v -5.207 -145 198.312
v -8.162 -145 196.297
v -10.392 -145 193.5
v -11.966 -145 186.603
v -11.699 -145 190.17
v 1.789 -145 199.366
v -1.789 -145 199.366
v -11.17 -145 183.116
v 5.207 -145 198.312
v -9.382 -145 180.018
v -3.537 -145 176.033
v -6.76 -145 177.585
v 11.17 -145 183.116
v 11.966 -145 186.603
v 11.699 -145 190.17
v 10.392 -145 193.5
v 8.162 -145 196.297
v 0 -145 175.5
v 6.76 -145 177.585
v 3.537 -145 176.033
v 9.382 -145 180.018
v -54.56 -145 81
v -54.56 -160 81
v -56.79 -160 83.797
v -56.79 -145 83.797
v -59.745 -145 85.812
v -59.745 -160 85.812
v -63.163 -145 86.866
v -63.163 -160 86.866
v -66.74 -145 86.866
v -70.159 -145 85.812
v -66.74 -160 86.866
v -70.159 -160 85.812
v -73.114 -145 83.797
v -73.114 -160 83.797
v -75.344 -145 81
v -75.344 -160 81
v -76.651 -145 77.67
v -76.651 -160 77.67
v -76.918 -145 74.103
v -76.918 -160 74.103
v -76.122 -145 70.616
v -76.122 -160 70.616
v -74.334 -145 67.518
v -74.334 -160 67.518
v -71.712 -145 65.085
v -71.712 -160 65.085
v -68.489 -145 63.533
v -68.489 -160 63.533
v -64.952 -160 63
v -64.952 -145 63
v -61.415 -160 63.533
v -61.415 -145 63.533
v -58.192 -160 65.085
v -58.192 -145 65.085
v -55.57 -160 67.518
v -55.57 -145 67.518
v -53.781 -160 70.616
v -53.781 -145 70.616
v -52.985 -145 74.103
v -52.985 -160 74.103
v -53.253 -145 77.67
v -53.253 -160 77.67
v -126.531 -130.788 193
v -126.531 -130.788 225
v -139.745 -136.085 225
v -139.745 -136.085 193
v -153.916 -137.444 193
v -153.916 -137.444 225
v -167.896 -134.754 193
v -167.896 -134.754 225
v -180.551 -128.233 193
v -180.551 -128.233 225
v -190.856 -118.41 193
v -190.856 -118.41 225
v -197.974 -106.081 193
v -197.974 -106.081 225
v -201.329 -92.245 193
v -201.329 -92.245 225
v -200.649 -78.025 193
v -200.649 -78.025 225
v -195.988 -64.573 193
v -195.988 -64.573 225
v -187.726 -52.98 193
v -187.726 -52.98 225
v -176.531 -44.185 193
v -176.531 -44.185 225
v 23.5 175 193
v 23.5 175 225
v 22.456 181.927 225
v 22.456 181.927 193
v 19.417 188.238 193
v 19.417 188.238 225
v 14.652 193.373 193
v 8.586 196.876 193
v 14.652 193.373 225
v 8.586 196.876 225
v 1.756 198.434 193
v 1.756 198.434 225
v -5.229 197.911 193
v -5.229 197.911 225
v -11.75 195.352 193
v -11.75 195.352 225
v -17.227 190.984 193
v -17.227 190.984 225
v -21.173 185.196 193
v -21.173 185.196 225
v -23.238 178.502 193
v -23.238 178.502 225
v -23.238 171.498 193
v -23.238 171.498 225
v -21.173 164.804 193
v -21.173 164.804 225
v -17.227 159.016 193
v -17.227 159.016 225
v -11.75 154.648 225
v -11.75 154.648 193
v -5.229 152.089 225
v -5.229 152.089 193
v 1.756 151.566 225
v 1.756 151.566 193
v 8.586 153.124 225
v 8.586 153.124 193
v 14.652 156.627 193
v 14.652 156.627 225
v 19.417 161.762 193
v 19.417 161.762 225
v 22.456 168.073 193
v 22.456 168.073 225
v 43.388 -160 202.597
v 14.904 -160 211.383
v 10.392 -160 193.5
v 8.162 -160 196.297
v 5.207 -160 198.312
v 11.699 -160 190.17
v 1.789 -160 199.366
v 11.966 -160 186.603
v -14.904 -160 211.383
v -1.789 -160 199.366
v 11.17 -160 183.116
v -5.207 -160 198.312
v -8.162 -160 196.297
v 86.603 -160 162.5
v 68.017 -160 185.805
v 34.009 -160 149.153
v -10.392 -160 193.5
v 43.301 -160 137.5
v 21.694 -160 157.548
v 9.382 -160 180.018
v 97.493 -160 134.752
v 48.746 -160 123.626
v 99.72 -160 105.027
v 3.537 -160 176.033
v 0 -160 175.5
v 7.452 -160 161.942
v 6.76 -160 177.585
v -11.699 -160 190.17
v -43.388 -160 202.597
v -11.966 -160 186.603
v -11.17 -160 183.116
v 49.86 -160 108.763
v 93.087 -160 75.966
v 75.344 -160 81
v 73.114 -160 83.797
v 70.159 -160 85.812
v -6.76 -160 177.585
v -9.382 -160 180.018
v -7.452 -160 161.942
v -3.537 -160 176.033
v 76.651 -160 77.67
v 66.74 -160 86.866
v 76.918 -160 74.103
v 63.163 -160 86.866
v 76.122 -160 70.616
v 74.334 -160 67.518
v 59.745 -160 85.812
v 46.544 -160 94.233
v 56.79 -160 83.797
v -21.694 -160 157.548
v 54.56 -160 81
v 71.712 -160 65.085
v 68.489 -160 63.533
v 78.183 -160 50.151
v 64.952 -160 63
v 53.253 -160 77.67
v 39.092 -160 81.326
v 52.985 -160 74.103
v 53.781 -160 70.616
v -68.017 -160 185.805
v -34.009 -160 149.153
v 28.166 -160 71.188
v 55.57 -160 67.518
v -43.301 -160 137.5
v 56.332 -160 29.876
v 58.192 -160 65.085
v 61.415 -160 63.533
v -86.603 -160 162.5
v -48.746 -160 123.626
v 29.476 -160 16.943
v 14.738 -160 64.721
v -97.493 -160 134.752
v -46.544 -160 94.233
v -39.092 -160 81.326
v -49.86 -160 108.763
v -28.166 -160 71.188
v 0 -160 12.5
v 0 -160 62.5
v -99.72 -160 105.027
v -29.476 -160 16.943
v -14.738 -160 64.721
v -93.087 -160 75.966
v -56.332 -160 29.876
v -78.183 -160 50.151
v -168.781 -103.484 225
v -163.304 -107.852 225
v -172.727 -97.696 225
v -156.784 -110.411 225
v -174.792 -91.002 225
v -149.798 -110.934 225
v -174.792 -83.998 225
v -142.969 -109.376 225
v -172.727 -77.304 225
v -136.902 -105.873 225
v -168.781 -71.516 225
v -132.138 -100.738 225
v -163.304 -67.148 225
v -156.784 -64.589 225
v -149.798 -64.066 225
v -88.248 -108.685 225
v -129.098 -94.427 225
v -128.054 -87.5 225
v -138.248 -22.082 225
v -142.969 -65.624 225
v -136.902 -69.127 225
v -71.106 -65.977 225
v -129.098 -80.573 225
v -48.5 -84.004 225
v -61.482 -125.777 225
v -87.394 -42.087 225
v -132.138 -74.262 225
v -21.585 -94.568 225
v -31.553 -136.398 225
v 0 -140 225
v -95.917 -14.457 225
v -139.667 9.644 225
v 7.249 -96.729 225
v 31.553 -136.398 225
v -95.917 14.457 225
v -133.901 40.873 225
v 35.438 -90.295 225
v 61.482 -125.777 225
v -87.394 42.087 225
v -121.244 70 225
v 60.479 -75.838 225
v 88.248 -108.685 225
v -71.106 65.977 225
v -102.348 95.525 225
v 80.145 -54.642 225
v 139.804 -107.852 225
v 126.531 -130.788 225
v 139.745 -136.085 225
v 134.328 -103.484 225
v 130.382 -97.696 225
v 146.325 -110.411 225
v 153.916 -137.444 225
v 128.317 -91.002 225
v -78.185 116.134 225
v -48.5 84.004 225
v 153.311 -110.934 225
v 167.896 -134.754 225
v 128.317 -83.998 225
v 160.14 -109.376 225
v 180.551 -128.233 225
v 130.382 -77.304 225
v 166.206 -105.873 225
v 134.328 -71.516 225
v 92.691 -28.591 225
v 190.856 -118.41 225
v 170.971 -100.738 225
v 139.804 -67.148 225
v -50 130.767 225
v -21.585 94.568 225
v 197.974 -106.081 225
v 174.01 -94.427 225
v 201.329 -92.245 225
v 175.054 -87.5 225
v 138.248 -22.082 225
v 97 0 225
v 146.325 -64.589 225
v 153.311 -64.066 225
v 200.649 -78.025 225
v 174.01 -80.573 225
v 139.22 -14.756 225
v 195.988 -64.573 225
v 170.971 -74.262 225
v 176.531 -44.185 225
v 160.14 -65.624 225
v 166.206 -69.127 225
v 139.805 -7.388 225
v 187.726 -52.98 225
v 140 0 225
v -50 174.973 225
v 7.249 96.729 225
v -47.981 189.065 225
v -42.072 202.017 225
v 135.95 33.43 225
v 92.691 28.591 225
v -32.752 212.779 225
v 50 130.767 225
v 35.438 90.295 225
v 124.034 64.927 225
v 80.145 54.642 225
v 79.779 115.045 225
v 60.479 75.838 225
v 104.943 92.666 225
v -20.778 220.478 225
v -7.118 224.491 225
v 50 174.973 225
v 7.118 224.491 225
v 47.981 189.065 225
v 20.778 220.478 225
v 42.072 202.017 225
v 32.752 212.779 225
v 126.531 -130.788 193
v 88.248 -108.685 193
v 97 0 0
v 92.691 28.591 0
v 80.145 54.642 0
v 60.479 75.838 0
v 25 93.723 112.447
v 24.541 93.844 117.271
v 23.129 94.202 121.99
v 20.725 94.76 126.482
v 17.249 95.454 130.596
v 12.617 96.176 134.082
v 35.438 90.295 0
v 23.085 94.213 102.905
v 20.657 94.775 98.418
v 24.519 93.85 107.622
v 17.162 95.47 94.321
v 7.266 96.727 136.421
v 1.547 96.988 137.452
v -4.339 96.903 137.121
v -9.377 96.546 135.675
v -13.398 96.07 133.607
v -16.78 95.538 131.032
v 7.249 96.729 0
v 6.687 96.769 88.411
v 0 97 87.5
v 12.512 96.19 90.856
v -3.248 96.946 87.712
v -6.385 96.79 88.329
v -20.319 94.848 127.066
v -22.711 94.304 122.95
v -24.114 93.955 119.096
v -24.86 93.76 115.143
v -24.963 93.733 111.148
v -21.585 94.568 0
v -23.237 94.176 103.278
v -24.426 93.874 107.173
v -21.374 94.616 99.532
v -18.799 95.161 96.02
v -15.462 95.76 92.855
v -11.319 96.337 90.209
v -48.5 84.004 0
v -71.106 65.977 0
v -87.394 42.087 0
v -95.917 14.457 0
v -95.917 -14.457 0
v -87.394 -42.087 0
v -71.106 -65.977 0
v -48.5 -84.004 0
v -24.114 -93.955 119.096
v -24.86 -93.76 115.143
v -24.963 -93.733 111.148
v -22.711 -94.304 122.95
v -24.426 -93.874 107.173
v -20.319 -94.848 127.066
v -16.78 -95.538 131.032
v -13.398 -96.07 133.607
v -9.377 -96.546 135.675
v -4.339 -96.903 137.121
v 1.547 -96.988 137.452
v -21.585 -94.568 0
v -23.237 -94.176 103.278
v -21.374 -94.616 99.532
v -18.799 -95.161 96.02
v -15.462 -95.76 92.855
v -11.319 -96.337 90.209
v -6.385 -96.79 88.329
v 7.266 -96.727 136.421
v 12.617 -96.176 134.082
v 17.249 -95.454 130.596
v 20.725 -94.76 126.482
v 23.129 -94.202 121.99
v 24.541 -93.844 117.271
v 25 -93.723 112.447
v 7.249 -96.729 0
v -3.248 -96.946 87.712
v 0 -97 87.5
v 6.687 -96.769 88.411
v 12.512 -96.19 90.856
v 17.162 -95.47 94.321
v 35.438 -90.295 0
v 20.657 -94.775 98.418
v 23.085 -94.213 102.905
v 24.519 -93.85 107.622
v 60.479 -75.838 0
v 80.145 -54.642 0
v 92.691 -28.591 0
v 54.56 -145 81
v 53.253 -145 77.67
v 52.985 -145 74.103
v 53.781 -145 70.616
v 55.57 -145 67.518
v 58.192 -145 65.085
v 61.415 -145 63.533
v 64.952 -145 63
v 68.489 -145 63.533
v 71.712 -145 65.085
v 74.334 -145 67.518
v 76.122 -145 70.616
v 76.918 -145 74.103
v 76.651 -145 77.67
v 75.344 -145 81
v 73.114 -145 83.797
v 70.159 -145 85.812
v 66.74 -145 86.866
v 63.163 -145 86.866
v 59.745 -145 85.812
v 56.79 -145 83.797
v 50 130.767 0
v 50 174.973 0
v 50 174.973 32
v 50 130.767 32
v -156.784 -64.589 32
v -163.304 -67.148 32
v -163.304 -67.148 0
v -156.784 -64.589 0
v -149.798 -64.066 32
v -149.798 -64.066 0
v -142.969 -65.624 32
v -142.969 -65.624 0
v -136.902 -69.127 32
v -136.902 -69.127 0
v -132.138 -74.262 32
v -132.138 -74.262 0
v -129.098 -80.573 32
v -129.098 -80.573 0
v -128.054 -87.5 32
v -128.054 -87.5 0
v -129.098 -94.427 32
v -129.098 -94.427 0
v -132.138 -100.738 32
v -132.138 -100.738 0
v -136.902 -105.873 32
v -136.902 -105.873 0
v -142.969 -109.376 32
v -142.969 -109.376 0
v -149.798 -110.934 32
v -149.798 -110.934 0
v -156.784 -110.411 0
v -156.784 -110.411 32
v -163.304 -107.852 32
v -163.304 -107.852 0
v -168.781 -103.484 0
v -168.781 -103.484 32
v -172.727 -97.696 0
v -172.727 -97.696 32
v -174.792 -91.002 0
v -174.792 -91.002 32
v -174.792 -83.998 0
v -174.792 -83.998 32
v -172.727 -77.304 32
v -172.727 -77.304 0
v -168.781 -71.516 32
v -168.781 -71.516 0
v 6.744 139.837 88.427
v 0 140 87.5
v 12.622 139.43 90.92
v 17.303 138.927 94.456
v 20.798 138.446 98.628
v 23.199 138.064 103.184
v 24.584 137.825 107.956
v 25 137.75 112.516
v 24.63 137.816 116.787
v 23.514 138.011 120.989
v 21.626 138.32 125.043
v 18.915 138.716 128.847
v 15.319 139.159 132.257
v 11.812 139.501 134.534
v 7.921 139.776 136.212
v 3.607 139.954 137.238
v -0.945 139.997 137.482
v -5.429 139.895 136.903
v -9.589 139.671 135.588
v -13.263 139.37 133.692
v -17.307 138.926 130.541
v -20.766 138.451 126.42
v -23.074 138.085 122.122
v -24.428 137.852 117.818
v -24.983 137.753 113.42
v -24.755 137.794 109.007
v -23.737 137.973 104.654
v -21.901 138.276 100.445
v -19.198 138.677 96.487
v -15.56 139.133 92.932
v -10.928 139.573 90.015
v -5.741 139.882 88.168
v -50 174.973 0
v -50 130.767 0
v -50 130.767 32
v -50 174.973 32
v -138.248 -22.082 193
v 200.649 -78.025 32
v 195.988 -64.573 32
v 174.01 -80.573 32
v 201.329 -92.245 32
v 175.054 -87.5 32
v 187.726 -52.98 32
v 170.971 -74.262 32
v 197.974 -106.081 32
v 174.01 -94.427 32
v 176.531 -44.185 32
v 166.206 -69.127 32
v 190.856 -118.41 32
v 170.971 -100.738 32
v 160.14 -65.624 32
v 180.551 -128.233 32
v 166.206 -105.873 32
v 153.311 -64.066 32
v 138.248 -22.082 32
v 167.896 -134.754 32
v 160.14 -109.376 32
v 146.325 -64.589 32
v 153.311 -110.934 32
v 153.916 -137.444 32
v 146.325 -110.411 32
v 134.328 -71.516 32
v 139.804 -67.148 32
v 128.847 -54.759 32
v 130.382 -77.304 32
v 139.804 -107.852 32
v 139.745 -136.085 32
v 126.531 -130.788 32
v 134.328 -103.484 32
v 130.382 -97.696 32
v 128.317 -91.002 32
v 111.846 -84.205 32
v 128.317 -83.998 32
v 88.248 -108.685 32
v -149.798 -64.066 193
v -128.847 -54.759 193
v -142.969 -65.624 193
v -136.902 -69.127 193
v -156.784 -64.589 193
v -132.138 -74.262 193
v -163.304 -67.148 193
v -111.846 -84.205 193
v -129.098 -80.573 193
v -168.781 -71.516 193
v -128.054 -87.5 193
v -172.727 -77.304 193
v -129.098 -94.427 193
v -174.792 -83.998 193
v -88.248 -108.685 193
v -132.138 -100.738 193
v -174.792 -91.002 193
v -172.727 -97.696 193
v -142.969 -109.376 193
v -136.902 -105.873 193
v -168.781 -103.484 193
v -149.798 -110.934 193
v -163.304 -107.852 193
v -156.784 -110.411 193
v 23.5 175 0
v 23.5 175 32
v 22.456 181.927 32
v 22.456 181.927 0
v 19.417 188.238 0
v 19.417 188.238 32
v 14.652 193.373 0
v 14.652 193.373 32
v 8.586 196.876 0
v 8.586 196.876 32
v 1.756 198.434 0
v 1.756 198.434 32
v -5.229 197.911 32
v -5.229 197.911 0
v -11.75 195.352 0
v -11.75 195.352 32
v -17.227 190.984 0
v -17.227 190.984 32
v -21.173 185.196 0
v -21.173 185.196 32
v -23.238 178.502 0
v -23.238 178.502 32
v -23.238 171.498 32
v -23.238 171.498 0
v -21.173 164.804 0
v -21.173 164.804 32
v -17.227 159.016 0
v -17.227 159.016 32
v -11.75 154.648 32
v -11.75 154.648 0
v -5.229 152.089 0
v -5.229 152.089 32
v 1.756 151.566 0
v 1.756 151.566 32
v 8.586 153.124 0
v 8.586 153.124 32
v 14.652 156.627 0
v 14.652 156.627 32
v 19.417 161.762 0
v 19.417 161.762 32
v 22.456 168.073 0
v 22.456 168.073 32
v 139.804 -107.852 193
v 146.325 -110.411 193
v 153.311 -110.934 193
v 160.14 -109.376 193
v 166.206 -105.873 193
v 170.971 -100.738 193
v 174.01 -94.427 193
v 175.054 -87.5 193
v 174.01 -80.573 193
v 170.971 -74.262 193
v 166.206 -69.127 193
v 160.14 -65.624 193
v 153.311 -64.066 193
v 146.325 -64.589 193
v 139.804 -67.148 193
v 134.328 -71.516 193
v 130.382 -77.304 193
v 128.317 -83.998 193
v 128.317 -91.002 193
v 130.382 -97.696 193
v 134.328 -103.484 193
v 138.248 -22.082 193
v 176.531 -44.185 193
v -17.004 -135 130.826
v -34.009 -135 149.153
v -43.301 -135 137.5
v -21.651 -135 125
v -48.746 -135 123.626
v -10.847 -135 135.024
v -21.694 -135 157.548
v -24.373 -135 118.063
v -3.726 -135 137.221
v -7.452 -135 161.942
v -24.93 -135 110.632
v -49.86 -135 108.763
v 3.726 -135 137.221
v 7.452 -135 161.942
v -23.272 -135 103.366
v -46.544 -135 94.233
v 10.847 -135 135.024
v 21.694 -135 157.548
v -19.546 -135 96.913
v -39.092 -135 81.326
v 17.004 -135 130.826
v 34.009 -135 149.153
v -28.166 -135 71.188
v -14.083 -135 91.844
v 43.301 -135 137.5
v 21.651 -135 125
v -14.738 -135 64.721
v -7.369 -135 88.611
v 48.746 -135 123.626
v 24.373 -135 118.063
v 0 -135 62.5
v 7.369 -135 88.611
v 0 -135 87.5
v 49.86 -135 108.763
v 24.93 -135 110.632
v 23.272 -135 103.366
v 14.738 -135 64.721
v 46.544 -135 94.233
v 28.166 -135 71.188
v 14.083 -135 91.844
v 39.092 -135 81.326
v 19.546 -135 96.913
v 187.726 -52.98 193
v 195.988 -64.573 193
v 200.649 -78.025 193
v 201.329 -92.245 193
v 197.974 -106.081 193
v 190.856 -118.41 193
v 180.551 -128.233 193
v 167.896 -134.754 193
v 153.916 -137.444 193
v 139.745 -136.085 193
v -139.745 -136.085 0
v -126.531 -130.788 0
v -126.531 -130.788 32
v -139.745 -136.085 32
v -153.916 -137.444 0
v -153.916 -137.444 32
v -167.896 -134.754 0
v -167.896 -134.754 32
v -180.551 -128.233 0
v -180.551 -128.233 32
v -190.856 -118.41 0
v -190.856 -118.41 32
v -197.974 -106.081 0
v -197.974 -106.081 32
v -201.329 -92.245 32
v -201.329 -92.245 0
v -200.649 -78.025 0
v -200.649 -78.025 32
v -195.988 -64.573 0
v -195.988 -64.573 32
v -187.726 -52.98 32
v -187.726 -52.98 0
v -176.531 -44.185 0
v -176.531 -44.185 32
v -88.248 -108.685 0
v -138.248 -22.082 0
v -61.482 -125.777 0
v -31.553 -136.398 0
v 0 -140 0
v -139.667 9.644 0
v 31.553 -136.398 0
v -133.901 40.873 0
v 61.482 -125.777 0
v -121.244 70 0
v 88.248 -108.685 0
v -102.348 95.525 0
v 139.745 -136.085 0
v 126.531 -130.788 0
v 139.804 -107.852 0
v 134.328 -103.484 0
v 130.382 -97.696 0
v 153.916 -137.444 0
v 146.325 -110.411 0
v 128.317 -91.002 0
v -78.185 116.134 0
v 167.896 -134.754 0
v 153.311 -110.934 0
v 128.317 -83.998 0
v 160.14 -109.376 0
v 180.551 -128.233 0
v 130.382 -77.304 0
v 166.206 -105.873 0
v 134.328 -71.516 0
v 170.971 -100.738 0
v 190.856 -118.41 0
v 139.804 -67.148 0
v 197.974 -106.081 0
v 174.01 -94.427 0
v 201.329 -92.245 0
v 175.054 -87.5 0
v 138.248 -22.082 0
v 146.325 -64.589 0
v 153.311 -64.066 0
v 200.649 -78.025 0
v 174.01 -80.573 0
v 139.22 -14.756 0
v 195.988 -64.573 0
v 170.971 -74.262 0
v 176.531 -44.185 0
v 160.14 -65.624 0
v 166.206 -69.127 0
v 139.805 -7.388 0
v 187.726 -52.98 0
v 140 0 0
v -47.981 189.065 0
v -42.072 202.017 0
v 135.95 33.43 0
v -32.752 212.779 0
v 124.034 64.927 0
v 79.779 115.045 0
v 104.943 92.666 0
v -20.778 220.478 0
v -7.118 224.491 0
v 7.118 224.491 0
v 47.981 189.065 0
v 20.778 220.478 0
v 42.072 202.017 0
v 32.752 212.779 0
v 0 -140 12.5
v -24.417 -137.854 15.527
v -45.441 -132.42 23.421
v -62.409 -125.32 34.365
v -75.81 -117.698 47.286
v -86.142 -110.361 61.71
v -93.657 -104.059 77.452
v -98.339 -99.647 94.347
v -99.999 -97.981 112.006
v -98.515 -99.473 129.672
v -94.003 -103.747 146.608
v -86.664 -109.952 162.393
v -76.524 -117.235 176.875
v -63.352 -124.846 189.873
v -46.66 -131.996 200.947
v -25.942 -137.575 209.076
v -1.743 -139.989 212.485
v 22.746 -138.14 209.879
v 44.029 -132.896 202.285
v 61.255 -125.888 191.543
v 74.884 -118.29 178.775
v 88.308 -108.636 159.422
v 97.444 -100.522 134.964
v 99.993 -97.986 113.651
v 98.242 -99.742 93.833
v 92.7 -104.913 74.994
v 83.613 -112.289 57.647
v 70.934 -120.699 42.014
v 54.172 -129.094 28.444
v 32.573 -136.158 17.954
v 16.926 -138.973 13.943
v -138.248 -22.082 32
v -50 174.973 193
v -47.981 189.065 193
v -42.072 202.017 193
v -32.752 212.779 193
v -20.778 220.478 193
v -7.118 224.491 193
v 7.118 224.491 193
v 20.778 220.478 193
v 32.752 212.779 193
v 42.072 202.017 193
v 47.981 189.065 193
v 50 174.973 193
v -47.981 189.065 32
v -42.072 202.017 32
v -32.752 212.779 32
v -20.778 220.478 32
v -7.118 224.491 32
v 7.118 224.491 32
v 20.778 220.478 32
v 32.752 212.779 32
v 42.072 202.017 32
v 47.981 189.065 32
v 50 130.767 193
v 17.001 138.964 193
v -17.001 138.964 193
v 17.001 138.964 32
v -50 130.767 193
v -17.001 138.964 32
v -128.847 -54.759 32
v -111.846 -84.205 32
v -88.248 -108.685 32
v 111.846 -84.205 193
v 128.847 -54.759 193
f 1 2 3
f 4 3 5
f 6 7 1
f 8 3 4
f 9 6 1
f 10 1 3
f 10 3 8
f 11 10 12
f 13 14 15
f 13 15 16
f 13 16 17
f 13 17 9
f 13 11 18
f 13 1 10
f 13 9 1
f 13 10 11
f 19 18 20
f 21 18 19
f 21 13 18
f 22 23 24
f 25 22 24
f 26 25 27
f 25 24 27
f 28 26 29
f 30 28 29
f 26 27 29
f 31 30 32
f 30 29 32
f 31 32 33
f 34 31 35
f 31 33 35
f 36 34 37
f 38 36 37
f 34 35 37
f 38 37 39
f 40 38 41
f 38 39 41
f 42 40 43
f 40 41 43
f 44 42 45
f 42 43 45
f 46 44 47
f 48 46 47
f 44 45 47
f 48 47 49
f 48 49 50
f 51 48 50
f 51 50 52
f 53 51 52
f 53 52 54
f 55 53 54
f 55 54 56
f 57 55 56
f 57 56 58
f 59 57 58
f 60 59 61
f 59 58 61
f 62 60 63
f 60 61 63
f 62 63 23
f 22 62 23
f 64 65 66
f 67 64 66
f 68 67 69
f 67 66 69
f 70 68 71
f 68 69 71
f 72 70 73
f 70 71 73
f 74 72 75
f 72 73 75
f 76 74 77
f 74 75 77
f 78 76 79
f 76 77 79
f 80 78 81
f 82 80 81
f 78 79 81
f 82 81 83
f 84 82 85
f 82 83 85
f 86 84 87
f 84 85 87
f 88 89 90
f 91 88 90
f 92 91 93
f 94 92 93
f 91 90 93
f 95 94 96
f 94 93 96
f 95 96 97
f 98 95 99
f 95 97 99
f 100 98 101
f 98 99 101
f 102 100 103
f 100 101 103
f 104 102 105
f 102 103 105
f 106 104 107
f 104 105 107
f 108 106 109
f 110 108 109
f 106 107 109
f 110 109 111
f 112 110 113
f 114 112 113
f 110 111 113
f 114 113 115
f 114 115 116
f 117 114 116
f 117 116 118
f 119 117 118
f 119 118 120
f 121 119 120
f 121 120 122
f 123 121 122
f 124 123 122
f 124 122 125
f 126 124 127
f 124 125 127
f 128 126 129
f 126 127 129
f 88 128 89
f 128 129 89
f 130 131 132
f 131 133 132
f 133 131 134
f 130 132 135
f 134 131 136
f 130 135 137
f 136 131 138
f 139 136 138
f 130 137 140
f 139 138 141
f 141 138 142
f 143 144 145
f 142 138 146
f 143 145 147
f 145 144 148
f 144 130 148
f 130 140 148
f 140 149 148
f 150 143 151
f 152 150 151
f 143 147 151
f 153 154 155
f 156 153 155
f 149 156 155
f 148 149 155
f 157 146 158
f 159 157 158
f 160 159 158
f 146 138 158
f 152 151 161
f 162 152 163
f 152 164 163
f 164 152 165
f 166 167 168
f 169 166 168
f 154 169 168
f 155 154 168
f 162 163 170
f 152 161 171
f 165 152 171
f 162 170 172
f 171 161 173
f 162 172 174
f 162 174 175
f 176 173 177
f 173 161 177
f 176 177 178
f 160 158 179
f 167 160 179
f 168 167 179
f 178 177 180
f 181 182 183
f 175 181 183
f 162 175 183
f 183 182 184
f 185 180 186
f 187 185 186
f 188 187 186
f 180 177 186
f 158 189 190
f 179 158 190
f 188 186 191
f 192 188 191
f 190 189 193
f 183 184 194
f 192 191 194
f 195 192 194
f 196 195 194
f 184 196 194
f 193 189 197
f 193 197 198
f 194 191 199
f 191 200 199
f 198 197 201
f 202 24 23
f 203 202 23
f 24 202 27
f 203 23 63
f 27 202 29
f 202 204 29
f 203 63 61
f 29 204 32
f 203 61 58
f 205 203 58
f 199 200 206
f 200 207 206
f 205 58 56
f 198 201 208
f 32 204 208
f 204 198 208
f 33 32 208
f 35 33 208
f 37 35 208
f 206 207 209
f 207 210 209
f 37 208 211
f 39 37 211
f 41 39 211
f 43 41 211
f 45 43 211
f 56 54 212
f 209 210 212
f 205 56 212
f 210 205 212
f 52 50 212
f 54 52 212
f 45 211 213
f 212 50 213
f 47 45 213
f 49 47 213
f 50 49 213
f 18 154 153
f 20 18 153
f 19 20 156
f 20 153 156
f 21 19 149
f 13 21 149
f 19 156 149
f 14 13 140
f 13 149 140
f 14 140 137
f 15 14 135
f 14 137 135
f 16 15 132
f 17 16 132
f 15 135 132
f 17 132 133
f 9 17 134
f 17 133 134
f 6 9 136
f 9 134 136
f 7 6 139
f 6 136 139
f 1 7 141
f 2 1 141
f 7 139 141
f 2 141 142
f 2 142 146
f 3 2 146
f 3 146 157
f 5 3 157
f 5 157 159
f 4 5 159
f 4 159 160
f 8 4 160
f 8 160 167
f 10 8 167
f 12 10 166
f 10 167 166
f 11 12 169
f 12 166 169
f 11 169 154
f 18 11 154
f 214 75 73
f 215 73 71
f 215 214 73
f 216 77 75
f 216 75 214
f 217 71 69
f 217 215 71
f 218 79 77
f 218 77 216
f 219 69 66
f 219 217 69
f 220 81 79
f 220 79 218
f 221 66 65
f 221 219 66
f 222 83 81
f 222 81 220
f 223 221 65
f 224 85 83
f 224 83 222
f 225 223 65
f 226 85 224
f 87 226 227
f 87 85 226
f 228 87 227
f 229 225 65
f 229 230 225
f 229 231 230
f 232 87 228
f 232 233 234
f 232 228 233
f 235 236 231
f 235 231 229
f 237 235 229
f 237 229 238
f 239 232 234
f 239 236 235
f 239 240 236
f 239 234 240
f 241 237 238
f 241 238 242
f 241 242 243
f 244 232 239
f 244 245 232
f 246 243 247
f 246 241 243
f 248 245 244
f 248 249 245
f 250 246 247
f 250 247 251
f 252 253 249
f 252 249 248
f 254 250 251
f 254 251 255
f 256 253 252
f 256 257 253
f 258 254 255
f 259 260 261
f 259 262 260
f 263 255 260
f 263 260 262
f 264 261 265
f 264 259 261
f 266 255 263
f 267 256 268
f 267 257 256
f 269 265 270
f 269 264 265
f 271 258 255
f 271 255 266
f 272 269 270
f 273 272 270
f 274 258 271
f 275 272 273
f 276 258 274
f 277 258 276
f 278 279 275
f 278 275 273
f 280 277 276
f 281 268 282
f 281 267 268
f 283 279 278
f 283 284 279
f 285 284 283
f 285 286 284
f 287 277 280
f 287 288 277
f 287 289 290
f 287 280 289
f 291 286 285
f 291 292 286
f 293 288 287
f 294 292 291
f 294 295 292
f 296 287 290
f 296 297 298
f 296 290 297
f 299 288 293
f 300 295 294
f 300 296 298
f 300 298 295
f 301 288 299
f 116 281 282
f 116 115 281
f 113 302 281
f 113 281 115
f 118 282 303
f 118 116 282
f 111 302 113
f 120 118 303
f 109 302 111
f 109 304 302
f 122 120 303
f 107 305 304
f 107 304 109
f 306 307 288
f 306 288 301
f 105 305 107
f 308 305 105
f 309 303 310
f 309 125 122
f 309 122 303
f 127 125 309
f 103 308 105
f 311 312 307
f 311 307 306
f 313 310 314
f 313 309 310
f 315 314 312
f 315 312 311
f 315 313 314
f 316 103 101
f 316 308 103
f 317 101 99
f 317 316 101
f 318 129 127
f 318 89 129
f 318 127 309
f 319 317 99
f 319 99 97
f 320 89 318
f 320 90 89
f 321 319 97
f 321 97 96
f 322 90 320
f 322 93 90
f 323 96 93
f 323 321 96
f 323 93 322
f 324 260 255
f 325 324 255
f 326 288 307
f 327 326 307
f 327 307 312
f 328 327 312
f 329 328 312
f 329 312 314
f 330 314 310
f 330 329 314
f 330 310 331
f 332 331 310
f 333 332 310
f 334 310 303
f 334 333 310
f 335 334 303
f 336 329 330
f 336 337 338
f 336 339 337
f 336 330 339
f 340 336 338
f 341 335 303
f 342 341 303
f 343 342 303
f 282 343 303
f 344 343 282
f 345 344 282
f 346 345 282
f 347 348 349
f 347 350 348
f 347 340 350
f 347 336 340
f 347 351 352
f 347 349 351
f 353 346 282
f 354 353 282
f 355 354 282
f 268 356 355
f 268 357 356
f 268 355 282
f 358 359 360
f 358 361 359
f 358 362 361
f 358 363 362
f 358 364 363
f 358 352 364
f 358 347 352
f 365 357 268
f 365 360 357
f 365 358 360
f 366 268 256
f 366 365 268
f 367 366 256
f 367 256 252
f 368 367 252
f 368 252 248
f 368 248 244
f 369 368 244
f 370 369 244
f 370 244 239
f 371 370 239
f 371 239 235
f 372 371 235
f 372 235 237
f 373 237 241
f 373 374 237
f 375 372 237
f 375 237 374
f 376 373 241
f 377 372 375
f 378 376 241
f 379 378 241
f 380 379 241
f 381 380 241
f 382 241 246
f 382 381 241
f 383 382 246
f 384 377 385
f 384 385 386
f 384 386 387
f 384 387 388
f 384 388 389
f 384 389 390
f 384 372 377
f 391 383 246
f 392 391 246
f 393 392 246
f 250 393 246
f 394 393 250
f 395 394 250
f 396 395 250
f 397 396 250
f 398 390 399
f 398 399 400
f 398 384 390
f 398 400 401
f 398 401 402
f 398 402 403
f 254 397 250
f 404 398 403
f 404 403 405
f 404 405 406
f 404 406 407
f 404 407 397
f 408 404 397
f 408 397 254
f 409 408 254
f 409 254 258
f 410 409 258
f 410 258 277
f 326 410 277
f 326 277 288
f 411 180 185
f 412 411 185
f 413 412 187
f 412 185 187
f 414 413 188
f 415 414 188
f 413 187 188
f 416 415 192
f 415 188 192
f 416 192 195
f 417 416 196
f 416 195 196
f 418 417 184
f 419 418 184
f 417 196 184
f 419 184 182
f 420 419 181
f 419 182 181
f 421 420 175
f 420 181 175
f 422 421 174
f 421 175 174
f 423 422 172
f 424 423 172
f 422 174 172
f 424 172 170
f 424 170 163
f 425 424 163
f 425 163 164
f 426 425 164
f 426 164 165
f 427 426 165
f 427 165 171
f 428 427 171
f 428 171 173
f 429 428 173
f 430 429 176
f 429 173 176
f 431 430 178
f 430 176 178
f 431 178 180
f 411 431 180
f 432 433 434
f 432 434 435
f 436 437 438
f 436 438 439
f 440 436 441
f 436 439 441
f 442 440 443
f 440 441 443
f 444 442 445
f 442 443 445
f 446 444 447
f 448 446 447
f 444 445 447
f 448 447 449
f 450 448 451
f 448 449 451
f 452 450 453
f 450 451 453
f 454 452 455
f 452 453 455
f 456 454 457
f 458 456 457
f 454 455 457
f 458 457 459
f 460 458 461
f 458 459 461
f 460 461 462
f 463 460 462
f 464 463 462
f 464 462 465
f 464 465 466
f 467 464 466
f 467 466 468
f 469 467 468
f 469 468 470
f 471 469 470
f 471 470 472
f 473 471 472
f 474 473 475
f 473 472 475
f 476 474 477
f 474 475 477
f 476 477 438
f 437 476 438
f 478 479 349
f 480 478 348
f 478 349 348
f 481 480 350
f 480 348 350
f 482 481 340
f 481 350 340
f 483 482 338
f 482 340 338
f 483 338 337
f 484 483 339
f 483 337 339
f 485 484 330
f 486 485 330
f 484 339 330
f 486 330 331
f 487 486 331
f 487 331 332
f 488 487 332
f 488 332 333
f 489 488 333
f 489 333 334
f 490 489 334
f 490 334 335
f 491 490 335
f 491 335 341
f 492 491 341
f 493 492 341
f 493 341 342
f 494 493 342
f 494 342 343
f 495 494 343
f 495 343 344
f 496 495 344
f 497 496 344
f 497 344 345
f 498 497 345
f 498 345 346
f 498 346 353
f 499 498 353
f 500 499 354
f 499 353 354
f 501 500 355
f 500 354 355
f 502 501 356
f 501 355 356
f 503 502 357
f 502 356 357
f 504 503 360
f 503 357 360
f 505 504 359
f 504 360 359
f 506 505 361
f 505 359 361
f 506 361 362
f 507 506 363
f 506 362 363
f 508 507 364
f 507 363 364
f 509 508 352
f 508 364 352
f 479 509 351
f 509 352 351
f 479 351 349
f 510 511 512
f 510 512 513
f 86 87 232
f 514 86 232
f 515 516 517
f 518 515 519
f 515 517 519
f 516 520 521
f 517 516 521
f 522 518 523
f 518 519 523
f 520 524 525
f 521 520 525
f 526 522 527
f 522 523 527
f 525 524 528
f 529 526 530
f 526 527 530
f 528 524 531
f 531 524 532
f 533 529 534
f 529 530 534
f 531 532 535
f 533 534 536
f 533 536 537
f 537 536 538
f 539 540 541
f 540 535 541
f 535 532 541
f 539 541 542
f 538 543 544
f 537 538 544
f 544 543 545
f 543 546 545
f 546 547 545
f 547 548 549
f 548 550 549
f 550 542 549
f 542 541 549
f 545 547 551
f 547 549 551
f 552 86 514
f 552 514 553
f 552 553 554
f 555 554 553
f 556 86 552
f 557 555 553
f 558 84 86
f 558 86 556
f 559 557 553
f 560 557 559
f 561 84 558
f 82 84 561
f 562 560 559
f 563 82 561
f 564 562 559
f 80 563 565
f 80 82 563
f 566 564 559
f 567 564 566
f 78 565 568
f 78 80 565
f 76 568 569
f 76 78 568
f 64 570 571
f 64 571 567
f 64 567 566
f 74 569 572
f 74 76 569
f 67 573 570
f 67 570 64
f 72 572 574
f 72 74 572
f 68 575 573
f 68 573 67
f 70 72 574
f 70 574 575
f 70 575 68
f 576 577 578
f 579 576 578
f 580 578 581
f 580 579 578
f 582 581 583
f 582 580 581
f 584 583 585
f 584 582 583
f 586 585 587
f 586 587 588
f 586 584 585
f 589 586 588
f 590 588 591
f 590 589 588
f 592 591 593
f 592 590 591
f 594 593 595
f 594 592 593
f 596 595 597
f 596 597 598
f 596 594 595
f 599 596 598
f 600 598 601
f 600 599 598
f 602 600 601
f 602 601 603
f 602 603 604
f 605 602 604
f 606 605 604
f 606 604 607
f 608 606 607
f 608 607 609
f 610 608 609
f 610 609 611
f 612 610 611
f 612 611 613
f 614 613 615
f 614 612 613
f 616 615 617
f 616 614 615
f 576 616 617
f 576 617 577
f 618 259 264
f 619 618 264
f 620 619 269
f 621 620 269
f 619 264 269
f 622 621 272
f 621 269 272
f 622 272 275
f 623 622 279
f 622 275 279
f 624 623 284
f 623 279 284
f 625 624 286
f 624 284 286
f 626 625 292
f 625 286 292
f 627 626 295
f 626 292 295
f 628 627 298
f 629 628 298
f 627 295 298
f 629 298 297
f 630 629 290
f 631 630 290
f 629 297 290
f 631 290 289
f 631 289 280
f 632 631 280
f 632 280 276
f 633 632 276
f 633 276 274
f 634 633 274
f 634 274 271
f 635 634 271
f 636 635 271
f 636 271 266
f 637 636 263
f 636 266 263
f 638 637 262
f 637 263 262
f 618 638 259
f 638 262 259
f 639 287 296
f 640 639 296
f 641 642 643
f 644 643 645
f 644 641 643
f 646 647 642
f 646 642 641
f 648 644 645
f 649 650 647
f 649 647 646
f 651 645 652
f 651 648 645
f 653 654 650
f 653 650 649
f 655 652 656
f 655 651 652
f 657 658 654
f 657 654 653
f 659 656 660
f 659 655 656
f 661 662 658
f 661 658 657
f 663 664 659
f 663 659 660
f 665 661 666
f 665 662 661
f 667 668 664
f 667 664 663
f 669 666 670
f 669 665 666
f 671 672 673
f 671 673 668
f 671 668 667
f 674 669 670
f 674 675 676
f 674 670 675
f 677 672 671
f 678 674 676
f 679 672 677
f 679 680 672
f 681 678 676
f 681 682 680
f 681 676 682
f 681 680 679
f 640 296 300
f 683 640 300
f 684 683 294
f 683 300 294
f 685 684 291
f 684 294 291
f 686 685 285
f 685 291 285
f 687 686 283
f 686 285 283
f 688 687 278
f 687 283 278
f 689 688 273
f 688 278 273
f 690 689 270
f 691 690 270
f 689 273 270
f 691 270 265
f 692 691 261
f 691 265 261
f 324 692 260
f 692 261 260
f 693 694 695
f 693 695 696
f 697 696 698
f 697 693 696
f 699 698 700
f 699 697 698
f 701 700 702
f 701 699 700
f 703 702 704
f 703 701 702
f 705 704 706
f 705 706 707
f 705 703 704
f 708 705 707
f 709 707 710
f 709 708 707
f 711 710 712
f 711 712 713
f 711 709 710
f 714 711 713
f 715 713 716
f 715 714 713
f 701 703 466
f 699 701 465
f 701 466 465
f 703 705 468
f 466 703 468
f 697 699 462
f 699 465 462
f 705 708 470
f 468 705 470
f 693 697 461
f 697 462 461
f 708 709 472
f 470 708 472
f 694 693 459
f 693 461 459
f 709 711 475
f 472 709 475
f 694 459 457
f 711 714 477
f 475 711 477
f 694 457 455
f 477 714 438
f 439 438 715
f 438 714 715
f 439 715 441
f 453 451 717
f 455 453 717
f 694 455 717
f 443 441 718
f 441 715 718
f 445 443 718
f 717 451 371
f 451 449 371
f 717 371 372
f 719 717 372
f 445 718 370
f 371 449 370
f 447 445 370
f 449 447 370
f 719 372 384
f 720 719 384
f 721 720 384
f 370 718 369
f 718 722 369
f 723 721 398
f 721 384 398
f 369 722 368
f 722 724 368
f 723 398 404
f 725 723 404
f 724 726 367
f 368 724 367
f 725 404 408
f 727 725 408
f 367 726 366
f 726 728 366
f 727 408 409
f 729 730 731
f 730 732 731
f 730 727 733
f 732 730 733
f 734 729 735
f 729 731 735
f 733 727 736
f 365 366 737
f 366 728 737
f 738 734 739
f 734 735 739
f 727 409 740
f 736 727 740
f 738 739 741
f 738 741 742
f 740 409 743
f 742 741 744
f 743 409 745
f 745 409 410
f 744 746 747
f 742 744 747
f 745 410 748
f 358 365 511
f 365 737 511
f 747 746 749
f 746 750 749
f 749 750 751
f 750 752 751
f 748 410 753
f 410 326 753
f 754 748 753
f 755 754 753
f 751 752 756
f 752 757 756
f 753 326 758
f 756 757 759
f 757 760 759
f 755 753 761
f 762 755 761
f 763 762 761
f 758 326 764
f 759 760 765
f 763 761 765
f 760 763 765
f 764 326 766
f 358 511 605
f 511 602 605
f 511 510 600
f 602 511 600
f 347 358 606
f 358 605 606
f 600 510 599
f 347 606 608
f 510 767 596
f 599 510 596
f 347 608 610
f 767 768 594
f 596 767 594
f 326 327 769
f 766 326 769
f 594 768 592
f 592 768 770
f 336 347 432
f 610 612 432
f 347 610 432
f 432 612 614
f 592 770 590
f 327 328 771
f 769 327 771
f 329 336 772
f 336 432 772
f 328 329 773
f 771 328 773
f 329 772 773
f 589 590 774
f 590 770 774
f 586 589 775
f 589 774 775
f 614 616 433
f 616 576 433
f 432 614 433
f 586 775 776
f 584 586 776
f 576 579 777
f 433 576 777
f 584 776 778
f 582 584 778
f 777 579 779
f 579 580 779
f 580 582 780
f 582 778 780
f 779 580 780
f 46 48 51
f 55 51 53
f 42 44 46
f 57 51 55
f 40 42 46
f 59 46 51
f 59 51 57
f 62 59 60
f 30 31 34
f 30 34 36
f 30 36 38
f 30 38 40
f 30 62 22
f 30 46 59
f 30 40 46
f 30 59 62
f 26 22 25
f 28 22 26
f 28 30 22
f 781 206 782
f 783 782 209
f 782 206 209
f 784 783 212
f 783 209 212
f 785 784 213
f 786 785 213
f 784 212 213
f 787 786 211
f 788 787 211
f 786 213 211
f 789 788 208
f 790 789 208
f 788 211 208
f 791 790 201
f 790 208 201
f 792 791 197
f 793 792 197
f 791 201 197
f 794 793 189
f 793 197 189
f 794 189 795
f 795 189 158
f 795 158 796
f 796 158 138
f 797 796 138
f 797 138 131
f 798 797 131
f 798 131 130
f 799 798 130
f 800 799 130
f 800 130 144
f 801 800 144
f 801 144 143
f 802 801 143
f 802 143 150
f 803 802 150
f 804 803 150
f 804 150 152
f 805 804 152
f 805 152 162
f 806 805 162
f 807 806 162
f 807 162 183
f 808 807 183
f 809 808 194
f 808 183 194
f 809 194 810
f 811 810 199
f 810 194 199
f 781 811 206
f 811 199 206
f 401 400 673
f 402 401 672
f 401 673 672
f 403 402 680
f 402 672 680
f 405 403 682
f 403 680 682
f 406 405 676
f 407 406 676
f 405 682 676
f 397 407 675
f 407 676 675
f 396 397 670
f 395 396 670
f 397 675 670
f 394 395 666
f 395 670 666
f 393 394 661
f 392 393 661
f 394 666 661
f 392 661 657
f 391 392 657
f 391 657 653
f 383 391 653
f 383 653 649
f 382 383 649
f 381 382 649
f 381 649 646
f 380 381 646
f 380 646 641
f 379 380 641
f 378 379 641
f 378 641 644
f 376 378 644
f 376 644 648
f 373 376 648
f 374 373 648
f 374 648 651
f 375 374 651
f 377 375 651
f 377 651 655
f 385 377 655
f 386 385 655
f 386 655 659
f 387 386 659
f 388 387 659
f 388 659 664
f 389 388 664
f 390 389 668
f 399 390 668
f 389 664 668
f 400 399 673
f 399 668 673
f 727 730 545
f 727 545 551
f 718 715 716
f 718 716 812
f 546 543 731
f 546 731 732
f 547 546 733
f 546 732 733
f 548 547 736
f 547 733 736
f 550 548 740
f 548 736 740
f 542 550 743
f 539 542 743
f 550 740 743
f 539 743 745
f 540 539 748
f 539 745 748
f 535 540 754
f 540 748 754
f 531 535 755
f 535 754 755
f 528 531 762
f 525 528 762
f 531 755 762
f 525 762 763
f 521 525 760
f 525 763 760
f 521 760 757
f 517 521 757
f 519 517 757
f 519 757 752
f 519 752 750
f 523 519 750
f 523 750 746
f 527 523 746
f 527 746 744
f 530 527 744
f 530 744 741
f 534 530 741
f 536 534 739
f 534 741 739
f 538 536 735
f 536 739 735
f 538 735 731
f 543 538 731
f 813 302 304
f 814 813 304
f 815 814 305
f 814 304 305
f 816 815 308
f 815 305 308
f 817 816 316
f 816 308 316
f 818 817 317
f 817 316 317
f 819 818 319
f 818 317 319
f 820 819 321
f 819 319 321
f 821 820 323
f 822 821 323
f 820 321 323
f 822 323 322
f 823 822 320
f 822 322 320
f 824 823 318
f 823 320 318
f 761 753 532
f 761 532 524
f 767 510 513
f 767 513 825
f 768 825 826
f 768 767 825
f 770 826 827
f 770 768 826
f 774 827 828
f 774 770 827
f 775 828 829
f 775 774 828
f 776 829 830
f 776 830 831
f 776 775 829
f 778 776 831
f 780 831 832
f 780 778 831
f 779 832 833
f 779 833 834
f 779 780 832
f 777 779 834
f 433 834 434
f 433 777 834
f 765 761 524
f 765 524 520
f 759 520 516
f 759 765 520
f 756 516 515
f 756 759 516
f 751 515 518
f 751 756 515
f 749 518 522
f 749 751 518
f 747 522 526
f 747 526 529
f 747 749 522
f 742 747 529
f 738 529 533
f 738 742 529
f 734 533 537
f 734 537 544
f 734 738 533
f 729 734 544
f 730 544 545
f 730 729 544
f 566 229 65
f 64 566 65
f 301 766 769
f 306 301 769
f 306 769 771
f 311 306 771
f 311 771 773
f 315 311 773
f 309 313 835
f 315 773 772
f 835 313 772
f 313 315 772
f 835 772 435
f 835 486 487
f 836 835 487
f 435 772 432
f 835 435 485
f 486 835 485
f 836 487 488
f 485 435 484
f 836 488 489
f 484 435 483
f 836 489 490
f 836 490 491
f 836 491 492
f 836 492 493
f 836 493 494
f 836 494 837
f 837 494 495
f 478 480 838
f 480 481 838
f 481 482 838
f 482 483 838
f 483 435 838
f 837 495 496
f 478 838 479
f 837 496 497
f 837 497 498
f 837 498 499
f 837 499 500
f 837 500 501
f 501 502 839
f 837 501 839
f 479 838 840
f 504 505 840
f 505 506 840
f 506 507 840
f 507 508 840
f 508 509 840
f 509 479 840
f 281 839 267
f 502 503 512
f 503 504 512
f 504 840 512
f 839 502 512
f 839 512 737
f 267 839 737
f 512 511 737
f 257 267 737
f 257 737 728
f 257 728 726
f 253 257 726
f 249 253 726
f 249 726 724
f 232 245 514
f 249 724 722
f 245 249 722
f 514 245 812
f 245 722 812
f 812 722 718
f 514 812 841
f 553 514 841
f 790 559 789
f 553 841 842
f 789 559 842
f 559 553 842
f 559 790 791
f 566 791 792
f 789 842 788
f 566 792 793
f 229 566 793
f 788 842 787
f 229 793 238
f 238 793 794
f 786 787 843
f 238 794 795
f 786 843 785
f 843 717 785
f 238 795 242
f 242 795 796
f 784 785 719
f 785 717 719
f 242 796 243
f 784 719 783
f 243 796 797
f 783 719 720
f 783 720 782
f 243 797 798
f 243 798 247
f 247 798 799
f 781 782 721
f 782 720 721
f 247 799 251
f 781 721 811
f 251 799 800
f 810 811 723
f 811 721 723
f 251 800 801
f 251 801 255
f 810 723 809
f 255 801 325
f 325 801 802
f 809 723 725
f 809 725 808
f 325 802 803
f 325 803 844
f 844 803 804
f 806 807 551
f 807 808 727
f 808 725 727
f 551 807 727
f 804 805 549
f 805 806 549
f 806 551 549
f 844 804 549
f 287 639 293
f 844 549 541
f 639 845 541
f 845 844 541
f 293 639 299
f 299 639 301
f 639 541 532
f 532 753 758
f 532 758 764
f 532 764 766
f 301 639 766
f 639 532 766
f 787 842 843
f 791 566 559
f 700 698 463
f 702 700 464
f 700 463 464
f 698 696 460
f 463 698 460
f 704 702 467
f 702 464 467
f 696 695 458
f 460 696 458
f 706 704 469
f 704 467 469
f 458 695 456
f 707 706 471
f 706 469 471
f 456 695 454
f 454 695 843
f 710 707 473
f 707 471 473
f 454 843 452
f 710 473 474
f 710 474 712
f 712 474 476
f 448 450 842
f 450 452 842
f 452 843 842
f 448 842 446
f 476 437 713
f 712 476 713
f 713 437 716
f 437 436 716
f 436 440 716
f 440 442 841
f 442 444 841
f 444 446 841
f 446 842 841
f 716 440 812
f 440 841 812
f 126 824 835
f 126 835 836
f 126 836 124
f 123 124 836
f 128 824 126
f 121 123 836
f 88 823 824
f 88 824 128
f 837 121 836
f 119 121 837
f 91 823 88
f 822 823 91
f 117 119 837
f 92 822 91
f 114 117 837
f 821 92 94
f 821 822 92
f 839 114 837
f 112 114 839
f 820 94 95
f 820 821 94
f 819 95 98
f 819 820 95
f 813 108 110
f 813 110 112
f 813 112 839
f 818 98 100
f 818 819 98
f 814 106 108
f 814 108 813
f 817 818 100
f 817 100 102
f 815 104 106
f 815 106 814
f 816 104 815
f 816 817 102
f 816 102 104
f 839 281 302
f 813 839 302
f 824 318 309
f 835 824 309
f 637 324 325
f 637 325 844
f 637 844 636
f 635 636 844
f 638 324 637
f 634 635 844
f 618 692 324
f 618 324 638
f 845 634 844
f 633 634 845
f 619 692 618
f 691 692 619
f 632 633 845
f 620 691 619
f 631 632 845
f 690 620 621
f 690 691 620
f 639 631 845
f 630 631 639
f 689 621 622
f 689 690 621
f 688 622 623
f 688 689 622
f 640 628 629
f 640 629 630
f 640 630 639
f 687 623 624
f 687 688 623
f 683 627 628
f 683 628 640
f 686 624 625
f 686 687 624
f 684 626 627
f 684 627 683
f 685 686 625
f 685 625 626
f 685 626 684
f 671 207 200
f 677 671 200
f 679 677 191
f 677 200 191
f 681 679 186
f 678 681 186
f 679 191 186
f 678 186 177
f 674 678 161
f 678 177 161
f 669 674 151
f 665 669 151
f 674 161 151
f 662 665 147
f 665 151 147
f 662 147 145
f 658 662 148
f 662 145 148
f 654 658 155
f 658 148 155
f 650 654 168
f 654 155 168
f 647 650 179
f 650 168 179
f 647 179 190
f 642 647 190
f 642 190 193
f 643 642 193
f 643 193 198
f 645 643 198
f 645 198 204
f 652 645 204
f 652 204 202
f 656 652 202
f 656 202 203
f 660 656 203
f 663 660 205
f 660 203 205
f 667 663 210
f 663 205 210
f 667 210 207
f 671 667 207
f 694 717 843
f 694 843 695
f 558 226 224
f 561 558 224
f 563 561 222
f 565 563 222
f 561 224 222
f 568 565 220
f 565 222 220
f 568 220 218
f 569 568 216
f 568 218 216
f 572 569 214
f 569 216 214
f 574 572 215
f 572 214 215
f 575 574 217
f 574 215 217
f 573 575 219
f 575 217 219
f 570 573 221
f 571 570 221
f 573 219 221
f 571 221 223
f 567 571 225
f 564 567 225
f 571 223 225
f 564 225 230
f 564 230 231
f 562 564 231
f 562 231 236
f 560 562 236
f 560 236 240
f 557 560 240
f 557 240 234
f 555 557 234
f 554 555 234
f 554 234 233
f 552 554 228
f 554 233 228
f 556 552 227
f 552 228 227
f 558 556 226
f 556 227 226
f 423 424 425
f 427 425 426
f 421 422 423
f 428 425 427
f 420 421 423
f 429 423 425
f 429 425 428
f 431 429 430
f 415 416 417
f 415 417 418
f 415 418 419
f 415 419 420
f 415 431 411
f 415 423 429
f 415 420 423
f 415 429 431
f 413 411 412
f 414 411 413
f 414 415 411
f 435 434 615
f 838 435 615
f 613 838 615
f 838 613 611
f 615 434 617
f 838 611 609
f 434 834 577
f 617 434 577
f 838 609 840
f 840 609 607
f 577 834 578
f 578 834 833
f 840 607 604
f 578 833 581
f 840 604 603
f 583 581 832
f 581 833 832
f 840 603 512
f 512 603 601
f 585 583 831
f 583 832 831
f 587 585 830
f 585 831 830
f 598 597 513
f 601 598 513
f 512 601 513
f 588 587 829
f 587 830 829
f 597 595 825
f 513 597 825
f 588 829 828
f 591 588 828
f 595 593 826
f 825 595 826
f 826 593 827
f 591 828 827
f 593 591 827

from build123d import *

# Parameters (mm, degrees)
SKETCH5_R                = 140
SKETCH5_R_2              = 97
BOSS_EXTRUDE2_DEPTH      = 225
SKETCH6_R                = 23.5
BOSS_EXTRUDE3_DEPTH      = 32
CIRPATTERN1_COUNT        = 3
MIRROR1_COPY_1_SKETCH_R  = 23.5
MIRROR1_COPY_1_DEPTH     = 32
MIRROR1_COPY_2_SKETCH_R  = 23.5
MIRROR1_COPY_2_DEPTH     = 32
BOSS_EXTRUDE4_REACH      = 491.361
BOSS_EXTRUDE4_END_RADIUS = 140
SKETCH7_R                = 100
SKETCH9_R                = 50
CUT_EXTRUDE2_DEPTH       = 25
SKETCH10_R               = 25
CUT_EXTRUDE3_DEPTH       = 470.945957604
SKETCH11_R               = 12
CUT_EXTRUDE4_DEPTH       = 15
CIRPATTERN4_COUNT        = 3


with BuildPart() as part:
    # Sketch5 → Boss-Extrude2 (new body)
    with BuildSketch(Plane.XY):
        Circle(SKETCH5_R)
        Circle(SKETCH5_R_2, mode=Mode.SUBTRACT)
    extrude(amount=BOSS_EXTRUDE2_DEPTH)

    # Sketch6 → Boss-Extrude3 (add)
    with BuildSketch(Plane.XY.offset(225)):
        with BuildLine():
            Line((50, 105.027441764), (-50, 105.027441764))
            Line((-50, 105.027441764), (-50, 174.972558236))
            ThreePointArc((-50, 174.972558236), (0, 225.000007531), (50, 174.972558236))
            Line((50, 174.972558236), (50, 105.027441764))
        make_face()
        with Locations((0, 175)):
            Circle(SKETCH6_R, mode=Mode.SUBTRACT)
    boss_extrude3 = extrude(amount=-BOSS_EXTRUDE3_DEPTH)

    # CirPattern1: Boss-Extrude3 ×3 about axis
    cirpattern1_axis = Axis((0, 0, 0), (0, 0, 1))
    for i in range(1, CIRPATTERN1_COUNT):
        add(boss_extrude3.rotate(cirpattern1_axis, i * 360 / CIRPATTERN1_COUNT))

    # Mirror1: Boss-Extrude3 across plane
    add(boss_extrude3.mirror(Plane(origin=(0, 0, 112.5), x_dir=(1, 0, 0), z_dir=(0, 0, -1))))

    # Mirror1 copy 1 sketch → Mirror1 copy 1 (add)
    with BuildSketch(Plane(origin=(0, 0, 0), x_dir=(-0.4999999999999998, 0.8660254037844387, 0), z_dir=(0, 0, -1))):
        with BuildLine():
            Line((50, -105.027441764), (-50, -105.027441764))
            Line((-50, -105.027441764), (-50, -174.972558236))
            ThreePointArc((-50, -174.972558236), (0, -225.000007531), (50, -174.972558236))
            Line((50, -174.972558236), (50, -105.027441764))
        make_face()
        with Locations((0, -175)):
            Circle(MIRROR1_COPY_1_SKETCH_R, mode=Mode.SUBTRACT)
    extrude(amount=-MIRROR1_COPY_1_DEPTH)

    # Mirror1 copy 2 sketch → Mirror1 copy 2 (add)
    with BuildSketch(Plane(origin=(0, 0, 0), x_dir=(-0.5000000000000004, -0.8660254037844384, 0), z_dir=(0, 0, -1))):
        with BuildLine():
            Line((50, -105.027441764), (-50, -105.027441764))
            Line((-50, -105.027441764), (-50, -174.972558236))
            ThreePointArc((-50, -174.972558236), (0, -225.000007531), (50, -174.972558236))
            Line((50, -174.972558236), (50, -105.027441764))
        make_face()
        with Locations((0, -175)):
            Circle(MIRROR1_COPY_2_SKETCH_R, mode=Mode.SUBTRACT)
    extrude(amount=-MIRROR1_COPY_2_DEPTH)

    # Boss-Extrude4: up to this cylinder (the profile starts outside it)
    boss_extrude4_end = Plane(origin=(0, 0, 112.5), z_dir=(0, 0, -1)) * Cylinder(BOSS_EXTRUDE4_END_RADIUS, 1263.722, mode=Mode.PRIVATE)
    # Sketch7 → Boss-Extrude4 (add, up to the surface)
    with BuildSketch(Plane(origin=(0, -160, 0), x_dir=(1, 0, 0), z_dir=(0, 1, 0)), mode=Mode.PRIVATE) as boss_extrude4_sk1:
        with Locations(Location((0, -112.5, 0), (0, 0, 90))):
            Circle(SKETCH7_R)
    boss_extrude4_tool1 = extrude(boss_extrude4_sk1.sketch, amount=BOSS_EXTRUDE4_REACH, mode=Mode.PRIVATE) - boss_extrude4_end
    add(boss_extrude4_tool1.solids().sort_by_distance((0, -160, 112.5))[0])

    # Sketch9 → Cut-Extrude2 (cut)
    with BuildSketch(Plane.XZ.offset(160)):
        with Locations(Location((0, 112.5, 0), (0, 0, 270))):
            Circle(SKETCH9_R)
    extrude(amount=-CUT_EXTRUDE2_DEPTH, mode=Mode.SUBTRACT)

    # Sketch10 → Cut-Extrude3 (cut, through all)
    with BuildSketch(Plane.XZ.offset(135)):
        with Locations(Location((0, 112.5, 0), (0, 0, 270))):
            Circle(SKETCH10_R)
    extrude(amount=-CUT_EXTRUDE3_DEPTH, mode=Mode.SUBTRACT)

    # Sketch11 → Cut-Extrude4 (cut)
    with BuildSketch(Plane.XZ.offset(160)):
        with Locations(Location((0, 187.5, 0), (0, 0, 270))):
            Circle(SKETCH11_R)
    cut_extrude4 = extrude(amount=-CUT_EXTRUDE4_DEPTH, mode=Mode.SUBTRACT)

    # CirPattern4: Cut-Extrude4 ×3 about axis
    cirpattern4_axis = Axis((0, 0, 112.5), (0, 1, 0))
    for i in range(1, CIRPATTERN4_COUNT):
        add(cut_extrude4.rotate(cirpattern4_axis, i * 360 / CIRPATTERN4_COUNT), mode=Mode.SUBTRACT)


solid = part.part
